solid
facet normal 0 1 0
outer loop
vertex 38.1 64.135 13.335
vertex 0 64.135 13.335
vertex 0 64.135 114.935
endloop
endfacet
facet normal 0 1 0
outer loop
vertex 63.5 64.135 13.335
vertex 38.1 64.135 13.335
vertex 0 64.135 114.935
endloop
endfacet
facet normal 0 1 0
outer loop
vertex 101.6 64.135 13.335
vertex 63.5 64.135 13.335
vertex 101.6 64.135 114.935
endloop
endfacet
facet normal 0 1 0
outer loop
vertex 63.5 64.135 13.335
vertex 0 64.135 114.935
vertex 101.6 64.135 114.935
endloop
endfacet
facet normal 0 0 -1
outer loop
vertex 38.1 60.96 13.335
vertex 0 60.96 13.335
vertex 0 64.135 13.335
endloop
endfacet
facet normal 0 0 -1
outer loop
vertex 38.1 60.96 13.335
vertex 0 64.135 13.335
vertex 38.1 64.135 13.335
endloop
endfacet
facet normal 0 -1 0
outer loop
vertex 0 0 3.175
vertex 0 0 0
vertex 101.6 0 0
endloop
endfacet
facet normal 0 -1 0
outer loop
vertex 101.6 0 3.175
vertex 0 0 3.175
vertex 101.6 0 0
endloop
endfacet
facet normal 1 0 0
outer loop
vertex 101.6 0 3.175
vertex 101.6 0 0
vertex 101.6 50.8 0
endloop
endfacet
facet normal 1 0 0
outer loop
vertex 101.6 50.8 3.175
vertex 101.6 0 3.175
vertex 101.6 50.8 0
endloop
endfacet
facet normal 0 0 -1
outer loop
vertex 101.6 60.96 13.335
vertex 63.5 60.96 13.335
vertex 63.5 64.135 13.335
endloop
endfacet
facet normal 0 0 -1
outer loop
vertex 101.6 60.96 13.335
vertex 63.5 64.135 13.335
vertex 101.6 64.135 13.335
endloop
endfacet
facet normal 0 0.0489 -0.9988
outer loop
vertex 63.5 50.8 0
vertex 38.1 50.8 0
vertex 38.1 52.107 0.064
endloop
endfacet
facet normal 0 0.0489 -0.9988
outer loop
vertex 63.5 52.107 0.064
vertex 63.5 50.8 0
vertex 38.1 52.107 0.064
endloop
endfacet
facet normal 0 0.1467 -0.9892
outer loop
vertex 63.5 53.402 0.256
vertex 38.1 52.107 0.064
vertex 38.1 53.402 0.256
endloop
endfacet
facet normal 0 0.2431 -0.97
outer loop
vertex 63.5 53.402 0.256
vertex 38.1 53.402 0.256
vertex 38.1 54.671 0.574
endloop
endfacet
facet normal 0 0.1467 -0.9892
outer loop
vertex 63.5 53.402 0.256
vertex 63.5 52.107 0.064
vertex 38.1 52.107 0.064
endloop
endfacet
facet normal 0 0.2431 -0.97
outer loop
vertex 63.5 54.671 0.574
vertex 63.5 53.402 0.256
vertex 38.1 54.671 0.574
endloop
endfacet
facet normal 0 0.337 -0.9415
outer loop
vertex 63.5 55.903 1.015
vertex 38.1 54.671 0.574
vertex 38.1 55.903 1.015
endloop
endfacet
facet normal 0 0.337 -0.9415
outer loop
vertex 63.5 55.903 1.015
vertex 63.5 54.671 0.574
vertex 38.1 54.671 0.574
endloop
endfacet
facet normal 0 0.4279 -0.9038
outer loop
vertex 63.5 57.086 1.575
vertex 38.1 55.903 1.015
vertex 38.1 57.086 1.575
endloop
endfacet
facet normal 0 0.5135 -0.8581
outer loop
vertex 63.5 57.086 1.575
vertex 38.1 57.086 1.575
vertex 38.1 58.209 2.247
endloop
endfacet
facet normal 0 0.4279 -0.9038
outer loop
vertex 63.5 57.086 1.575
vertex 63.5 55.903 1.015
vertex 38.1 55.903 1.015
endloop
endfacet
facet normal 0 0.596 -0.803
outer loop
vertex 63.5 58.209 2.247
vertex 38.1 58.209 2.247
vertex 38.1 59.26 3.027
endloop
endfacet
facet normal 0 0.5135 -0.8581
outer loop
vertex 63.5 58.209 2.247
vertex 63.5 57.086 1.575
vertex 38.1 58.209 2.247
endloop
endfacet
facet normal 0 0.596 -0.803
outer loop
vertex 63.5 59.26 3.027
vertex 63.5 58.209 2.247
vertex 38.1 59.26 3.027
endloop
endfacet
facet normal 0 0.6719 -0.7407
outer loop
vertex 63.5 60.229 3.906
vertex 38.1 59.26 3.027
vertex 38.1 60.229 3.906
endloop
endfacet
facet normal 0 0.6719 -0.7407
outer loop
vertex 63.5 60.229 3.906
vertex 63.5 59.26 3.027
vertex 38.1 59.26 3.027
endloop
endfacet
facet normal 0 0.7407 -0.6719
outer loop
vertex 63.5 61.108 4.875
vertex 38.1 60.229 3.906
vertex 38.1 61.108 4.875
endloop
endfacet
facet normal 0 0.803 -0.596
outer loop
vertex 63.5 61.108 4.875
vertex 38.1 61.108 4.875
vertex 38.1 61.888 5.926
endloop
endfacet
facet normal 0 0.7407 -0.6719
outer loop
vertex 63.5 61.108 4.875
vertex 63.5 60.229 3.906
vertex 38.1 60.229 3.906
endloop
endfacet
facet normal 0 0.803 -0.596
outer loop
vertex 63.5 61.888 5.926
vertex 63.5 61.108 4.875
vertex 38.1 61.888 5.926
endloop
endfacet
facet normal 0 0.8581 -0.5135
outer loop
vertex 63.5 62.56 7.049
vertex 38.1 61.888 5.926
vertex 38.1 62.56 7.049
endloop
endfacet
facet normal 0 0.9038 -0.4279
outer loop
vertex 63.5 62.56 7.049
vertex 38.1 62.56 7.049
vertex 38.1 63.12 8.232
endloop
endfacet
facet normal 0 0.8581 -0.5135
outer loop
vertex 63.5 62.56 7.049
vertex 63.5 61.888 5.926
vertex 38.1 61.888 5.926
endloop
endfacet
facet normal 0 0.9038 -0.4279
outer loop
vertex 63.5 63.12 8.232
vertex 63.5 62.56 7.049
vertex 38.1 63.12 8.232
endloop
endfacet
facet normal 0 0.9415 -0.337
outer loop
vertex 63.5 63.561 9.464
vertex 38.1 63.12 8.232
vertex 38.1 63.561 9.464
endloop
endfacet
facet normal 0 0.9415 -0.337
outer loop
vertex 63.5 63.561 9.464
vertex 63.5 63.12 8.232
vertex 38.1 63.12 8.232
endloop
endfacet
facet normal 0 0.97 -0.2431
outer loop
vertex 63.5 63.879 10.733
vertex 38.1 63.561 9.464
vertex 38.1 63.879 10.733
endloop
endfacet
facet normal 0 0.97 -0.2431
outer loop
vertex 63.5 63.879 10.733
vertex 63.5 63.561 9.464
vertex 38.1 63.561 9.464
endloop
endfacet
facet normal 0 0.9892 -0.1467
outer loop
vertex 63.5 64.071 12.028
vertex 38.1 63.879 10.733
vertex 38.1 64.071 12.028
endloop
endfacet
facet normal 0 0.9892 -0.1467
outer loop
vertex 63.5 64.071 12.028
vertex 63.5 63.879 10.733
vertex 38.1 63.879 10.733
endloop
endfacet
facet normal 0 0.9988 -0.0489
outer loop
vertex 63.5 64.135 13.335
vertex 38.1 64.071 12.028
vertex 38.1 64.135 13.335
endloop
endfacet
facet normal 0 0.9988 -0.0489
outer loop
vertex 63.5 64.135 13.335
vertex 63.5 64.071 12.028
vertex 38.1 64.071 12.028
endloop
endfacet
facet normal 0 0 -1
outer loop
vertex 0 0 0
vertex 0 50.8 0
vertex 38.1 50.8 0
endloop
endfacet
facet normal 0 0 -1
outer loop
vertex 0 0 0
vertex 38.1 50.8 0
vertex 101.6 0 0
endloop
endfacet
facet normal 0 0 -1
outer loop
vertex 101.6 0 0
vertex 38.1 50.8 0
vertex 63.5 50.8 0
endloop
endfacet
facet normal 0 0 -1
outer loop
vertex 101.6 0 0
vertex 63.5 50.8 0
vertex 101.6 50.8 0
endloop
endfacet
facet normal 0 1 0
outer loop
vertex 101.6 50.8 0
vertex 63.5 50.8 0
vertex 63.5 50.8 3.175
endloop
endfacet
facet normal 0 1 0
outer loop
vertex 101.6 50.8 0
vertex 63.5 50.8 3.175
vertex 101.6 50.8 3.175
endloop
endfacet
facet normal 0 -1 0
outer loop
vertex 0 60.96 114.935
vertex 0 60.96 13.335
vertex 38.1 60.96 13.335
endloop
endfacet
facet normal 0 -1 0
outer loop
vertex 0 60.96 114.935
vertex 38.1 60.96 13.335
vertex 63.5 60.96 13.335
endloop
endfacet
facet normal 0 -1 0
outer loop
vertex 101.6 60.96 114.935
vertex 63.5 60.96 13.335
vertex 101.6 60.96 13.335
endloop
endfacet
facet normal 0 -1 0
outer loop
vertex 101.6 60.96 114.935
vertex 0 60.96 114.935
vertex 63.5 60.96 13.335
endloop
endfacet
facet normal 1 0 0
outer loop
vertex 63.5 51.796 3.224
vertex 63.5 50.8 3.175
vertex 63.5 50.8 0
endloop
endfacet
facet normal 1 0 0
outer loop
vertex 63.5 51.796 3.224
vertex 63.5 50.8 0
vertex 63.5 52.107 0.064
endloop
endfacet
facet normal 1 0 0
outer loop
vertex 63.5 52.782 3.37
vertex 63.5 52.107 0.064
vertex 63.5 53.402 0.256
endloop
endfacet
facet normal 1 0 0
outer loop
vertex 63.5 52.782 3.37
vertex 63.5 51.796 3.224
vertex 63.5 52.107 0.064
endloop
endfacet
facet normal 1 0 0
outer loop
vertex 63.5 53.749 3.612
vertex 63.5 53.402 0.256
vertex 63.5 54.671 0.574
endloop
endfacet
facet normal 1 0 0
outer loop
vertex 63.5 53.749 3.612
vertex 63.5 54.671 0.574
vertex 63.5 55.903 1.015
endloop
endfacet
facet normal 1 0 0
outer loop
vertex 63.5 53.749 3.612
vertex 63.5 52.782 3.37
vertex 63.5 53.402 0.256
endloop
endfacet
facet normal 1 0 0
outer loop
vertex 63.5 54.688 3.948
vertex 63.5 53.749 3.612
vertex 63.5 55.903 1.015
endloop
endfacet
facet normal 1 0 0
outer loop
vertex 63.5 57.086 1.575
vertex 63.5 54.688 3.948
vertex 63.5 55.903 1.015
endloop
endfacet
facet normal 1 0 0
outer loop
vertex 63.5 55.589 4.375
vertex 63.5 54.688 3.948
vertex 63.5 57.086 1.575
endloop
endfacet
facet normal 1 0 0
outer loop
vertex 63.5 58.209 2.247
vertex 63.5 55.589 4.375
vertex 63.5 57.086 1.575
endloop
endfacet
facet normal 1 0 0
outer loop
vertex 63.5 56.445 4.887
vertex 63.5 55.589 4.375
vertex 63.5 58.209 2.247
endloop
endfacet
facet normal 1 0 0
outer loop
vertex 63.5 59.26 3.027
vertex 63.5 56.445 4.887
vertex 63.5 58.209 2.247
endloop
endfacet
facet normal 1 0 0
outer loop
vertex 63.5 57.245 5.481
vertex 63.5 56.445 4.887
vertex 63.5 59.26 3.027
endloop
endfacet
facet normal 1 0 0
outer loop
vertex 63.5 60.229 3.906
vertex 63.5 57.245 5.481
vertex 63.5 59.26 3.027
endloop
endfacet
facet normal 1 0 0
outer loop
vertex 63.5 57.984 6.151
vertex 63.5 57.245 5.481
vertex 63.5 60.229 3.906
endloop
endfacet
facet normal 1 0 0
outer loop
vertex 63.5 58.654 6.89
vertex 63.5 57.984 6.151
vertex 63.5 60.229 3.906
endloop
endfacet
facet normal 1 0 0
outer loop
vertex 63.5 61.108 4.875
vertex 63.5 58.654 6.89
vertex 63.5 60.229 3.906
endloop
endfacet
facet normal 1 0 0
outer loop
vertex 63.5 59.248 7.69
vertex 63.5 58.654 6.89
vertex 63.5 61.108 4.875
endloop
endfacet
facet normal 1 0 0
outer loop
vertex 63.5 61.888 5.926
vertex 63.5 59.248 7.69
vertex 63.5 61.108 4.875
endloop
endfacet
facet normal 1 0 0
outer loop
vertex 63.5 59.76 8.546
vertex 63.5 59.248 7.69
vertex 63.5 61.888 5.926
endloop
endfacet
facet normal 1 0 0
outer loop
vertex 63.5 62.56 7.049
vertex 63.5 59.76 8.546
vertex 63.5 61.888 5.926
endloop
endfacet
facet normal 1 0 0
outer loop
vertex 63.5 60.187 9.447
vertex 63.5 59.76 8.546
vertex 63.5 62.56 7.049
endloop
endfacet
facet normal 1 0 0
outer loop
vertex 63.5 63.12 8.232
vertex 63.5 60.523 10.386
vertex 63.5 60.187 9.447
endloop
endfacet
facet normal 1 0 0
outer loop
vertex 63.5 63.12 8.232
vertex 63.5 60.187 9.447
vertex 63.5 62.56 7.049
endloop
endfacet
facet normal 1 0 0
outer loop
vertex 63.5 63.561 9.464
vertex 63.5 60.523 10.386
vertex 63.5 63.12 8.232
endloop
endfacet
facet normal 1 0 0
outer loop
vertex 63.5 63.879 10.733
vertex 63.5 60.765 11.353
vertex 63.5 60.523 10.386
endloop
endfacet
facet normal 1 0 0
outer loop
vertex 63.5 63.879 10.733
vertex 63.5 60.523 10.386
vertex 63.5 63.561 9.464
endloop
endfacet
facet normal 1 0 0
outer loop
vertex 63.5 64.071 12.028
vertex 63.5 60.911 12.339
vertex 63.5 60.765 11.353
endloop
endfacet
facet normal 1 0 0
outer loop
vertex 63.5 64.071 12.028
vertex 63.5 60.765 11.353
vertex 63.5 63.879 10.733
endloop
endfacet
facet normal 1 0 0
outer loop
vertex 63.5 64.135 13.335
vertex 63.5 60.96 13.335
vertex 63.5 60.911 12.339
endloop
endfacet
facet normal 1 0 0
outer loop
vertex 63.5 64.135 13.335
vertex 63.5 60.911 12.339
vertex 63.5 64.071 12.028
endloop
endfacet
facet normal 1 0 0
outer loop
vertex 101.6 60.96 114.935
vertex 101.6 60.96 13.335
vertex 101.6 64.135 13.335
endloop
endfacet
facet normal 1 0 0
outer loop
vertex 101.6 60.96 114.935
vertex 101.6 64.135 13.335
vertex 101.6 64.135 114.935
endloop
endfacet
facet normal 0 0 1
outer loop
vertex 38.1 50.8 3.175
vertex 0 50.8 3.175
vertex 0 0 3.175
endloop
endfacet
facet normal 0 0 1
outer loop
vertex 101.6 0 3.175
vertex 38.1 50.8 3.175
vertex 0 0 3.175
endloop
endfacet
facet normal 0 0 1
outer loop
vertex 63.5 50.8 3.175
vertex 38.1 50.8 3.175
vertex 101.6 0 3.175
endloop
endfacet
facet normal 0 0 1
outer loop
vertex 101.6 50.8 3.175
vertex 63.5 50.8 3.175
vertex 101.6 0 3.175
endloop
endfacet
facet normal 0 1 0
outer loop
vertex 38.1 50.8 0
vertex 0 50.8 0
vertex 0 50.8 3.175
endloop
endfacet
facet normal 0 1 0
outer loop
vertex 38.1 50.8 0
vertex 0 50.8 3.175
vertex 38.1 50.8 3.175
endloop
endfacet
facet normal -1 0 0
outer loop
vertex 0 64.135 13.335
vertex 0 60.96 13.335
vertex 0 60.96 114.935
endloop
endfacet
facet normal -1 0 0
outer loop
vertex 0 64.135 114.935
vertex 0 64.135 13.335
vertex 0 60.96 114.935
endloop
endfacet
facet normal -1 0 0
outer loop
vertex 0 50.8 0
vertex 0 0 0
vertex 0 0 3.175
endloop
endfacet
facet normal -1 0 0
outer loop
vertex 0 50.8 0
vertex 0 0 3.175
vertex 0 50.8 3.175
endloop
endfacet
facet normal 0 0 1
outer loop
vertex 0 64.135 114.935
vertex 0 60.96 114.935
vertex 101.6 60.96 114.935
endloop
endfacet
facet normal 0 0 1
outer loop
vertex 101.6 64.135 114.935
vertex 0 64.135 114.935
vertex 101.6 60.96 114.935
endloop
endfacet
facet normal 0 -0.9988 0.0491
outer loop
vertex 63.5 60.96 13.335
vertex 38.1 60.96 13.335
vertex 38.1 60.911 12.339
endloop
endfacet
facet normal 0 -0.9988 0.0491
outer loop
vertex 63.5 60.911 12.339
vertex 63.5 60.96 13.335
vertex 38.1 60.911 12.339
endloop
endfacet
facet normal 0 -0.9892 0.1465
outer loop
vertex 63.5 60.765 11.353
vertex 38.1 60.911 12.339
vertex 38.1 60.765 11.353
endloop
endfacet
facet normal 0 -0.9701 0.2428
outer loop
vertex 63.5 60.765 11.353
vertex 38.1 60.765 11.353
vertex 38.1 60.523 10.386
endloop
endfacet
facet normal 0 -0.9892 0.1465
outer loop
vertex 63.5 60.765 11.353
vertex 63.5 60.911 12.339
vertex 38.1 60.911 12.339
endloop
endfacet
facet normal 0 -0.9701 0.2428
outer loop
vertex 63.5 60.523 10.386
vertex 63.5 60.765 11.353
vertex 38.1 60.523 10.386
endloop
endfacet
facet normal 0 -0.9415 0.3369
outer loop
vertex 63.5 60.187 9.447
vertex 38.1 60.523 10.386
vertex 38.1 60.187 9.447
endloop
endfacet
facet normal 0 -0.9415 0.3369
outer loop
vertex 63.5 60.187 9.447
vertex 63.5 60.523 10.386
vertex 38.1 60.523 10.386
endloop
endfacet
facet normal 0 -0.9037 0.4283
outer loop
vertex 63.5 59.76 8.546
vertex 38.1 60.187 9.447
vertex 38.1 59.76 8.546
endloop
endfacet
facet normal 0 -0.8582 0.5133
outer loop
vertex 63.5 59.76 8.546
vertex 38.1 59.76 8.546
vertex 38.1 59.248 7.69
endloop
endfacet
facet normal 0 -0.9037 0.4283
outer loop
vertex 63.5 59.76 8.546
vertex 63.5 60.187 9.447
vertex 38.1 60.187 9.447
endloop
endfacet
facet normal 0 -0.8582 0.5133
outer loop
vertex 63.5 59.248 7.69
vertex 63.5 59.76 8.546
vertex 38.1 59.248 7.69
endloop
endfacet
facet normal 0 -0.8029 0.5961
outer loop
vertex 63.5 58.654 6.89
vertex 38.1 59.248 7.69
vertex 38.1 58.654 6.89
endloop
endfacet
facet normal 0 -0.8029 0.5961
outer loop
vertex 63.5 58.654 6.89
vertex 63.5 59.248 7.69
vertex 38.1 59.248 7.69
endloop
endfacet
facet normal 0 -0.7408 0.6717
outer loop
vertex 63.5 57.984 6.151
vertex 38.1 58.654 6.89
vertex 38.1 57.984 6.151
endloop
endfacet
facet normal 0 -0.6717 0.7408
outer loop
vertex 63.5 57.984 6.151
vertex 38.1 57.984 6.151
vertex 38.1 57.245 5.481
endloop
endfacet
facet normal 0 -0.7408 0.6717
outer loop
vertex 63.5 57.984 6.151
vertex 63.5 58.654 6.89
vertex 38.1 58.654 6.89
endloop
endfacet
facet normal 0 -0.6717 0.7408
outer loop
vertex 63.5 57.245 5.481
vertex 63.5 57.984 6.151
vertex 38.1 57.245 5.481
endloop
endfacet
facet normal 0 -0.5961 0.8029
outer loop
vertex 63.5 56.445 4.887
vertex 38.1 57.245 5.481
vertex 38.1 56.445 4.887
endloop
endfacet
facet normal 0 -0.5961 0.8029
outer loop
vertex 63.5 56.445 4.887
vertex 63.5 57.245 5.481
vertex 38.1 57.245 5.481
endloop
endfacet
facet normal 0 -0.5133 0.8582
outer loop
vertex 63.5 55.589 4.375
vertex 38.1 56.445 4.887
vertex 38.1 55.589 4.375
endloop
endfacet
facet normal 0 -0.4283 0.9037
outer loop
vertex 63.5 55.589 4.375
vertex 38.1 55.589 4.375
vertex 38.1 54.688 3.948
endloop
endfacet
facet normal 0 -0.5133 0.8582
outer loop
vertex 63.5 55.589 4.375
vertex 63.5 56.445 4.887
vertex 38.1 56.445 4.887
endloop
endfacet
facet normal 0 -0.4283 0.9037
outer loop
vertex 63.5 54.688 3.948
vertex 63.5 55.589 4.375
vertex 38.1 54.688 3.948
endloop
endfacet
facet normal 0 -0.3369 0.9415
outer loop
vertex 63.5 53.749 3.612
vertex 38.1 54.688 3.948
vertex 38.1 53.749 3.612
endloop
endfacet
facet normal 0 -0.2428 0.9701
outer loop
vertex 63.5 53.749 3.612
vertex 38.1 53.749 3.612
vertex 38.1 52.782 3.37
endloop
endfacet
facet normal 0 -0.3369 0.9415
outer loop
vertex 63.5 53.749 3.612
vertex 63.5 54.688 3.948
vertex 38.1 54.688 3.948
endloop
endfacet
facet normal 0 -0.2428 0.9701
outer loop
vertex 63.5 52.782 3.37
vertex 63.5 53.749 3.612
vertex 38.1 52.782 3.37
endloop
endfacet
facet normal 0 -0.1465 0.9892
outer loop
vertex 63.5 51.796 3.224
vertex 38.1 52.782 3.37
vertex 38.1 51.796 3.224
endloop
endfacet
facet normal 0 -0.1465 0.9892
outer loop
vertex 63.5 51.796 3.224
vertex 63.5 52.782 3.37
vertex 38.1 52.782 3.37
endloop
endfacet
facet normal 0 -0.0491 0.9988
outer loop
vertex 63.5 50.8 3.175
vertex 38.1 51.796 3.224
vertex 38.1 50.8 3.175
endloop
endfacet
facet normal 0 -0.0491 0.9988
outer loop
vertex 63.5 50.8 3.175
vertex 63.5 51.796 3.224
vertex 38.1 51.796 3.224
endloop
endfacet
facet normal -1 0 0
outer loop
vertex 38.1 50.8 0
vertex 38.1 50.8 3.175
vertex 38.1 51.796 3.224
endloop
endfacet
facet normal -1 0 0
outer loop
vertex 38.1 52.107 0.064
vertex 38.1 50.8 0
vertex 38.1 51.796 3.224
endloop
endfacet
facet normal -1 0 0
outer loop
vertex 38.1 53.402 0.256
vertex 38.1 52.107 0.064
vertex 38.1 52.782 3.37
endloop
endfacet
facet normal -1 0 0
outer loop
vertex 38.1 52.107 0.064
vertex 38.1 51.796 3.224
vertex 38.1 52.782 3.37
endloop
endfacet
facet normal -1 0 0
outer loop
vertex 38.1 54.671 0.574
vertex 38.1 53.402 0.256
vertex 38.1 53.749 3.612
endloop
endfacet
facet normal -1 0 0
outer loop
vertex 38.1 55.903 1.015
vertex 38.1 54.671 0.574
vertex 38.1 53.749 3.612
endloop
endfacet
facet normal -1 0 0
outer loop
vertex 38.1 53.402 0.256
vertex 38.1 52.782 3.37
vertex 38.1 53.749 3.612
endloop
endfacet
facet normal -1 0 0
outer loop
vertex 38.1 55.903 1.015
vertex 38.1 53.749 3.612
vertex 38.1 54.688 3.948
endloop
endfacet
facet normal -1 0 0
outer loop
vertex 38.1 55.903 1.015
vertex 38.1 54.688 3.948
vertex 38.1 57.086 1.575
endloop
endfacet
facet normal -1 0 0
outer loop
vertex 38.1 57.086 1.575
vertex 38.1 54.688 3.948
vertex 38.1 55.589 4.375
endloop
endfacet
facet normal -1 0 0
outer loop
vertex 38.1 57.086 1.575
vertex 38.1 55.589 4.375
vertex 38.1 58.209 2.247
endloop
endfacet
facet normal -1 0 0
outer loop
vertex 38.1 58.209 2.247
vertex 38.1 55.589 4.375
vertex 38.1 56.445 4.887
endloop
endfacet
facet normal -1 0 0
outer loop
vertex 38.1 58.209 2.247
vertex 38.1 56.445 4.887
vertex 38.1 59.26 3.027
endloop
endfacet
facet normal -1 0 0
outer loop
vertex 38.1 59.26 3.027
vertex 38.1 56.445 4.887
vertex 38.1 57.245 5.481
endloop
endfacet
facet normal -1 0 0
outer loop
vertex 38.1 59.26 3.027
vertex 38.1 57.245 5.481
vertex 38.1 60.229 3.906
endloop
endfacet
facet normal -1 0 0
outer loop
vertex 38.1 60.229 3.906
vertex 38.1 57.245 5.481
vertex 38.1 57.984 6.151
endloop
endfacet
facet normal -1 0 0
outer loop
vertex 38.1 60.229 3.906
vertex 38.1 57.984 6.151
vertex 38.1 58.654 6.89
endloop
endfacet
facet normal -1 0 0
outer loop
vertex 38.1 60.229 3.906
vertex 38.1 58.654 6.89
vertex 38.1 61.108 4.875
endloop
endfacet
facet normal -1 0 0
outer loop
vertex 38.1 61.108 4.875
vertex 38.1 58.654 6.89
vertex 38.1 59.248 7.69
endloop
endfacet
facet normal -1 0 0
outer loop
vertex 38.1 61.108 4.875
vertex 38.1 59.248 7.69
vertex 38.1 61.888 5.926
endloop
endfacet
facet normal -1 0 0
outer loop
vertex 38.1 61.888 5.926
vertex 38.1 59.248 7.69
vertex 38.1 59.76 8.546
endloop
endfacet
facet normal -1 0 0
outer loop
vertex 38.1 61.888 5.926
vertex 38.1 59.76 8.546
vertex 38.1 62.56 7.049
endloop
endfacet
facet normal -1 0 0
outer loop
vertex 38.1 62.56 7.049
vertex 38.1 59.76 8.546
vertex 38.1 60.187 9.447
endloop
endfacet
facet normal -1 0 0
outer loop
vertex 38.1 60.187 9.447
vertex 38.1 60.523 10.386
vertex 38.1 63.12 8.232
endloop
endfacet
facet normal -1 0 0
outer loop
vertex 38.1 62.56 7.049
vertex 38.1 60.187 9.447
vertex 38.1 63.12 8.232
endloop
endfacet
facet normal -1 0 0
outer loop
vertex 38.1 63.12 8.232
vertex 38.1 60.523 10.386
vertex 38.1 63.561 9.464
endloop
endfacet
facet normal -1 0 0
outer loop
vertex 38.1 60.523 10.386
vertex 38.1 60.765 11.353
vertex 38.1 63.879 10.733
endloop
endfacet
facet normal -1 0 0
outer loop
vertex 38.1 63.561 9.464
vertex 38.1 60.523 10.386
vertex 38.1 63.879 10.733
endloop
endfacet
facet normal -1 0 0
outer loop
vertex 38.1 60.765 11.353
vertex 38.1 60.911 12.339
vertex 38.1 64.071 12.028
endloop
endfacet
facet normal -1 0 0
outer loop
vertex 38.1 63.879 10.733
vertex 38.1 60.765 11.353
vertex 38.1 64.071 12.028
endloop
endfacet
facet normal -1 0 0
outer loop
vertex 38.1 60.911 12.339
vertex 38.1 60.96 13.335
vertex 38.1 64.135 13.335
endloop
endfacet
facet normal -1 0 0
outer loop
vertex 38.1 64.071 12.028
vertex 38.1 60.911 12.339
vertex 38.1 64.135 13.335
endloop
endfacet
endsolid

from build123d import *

# Parameters (mm, degrees)
F0_W          = 101.6
F0_H          = 50.8
F1_DEPTH      = 3.175
F5_DEPTH      = 12.7
F5_DEPTH_BACK = 12.7
F8_W          = 101.6
F8_H          = 101.6
F9_DEPTH      = 3.175


with BuildPart() as f1:
    # F0 (on Top) → F1 (new body)
    with BuildSketch(Plane.XY):
        with Locations((50.8, 25.4)):
            Rectangle(F0_W, F0_H)
    extrude(amount=F1_DEPTH)

    # F4 (on plane+point) → F5 (join, two sides)
    with BuildSketch(Plane.YZ.offset(50.8)) as f5_sk:
        with BuildLine():
            ThreePointArc((60.96, 13.335), (57.9842048969, 6.1507951031), (50.8, 3.175))
            Line((50.8, 3.175), (50.8, 0))
            ThreePointArc((50.8, 0), (60.2292689271, 3.9057310729), (64.135, 13.335))
            Line((64.135, 13.335), (60.96, 13.335))
        make_face()
    extrude(amount=F5_DEPTH)
    extrude(f5_sk.sketch, amount=-F5_DEPTH_BACK)

    # F8 (on plane+point) → F9 (join)
    with BuildSketch(Plane.XZ.offset(-60.96)):
        with Locations((50.8, 64.135)):
            Rectangle(F8_W, F8_H)
    extrude(amount=-F9_DEPTH)


solid = f1.part
